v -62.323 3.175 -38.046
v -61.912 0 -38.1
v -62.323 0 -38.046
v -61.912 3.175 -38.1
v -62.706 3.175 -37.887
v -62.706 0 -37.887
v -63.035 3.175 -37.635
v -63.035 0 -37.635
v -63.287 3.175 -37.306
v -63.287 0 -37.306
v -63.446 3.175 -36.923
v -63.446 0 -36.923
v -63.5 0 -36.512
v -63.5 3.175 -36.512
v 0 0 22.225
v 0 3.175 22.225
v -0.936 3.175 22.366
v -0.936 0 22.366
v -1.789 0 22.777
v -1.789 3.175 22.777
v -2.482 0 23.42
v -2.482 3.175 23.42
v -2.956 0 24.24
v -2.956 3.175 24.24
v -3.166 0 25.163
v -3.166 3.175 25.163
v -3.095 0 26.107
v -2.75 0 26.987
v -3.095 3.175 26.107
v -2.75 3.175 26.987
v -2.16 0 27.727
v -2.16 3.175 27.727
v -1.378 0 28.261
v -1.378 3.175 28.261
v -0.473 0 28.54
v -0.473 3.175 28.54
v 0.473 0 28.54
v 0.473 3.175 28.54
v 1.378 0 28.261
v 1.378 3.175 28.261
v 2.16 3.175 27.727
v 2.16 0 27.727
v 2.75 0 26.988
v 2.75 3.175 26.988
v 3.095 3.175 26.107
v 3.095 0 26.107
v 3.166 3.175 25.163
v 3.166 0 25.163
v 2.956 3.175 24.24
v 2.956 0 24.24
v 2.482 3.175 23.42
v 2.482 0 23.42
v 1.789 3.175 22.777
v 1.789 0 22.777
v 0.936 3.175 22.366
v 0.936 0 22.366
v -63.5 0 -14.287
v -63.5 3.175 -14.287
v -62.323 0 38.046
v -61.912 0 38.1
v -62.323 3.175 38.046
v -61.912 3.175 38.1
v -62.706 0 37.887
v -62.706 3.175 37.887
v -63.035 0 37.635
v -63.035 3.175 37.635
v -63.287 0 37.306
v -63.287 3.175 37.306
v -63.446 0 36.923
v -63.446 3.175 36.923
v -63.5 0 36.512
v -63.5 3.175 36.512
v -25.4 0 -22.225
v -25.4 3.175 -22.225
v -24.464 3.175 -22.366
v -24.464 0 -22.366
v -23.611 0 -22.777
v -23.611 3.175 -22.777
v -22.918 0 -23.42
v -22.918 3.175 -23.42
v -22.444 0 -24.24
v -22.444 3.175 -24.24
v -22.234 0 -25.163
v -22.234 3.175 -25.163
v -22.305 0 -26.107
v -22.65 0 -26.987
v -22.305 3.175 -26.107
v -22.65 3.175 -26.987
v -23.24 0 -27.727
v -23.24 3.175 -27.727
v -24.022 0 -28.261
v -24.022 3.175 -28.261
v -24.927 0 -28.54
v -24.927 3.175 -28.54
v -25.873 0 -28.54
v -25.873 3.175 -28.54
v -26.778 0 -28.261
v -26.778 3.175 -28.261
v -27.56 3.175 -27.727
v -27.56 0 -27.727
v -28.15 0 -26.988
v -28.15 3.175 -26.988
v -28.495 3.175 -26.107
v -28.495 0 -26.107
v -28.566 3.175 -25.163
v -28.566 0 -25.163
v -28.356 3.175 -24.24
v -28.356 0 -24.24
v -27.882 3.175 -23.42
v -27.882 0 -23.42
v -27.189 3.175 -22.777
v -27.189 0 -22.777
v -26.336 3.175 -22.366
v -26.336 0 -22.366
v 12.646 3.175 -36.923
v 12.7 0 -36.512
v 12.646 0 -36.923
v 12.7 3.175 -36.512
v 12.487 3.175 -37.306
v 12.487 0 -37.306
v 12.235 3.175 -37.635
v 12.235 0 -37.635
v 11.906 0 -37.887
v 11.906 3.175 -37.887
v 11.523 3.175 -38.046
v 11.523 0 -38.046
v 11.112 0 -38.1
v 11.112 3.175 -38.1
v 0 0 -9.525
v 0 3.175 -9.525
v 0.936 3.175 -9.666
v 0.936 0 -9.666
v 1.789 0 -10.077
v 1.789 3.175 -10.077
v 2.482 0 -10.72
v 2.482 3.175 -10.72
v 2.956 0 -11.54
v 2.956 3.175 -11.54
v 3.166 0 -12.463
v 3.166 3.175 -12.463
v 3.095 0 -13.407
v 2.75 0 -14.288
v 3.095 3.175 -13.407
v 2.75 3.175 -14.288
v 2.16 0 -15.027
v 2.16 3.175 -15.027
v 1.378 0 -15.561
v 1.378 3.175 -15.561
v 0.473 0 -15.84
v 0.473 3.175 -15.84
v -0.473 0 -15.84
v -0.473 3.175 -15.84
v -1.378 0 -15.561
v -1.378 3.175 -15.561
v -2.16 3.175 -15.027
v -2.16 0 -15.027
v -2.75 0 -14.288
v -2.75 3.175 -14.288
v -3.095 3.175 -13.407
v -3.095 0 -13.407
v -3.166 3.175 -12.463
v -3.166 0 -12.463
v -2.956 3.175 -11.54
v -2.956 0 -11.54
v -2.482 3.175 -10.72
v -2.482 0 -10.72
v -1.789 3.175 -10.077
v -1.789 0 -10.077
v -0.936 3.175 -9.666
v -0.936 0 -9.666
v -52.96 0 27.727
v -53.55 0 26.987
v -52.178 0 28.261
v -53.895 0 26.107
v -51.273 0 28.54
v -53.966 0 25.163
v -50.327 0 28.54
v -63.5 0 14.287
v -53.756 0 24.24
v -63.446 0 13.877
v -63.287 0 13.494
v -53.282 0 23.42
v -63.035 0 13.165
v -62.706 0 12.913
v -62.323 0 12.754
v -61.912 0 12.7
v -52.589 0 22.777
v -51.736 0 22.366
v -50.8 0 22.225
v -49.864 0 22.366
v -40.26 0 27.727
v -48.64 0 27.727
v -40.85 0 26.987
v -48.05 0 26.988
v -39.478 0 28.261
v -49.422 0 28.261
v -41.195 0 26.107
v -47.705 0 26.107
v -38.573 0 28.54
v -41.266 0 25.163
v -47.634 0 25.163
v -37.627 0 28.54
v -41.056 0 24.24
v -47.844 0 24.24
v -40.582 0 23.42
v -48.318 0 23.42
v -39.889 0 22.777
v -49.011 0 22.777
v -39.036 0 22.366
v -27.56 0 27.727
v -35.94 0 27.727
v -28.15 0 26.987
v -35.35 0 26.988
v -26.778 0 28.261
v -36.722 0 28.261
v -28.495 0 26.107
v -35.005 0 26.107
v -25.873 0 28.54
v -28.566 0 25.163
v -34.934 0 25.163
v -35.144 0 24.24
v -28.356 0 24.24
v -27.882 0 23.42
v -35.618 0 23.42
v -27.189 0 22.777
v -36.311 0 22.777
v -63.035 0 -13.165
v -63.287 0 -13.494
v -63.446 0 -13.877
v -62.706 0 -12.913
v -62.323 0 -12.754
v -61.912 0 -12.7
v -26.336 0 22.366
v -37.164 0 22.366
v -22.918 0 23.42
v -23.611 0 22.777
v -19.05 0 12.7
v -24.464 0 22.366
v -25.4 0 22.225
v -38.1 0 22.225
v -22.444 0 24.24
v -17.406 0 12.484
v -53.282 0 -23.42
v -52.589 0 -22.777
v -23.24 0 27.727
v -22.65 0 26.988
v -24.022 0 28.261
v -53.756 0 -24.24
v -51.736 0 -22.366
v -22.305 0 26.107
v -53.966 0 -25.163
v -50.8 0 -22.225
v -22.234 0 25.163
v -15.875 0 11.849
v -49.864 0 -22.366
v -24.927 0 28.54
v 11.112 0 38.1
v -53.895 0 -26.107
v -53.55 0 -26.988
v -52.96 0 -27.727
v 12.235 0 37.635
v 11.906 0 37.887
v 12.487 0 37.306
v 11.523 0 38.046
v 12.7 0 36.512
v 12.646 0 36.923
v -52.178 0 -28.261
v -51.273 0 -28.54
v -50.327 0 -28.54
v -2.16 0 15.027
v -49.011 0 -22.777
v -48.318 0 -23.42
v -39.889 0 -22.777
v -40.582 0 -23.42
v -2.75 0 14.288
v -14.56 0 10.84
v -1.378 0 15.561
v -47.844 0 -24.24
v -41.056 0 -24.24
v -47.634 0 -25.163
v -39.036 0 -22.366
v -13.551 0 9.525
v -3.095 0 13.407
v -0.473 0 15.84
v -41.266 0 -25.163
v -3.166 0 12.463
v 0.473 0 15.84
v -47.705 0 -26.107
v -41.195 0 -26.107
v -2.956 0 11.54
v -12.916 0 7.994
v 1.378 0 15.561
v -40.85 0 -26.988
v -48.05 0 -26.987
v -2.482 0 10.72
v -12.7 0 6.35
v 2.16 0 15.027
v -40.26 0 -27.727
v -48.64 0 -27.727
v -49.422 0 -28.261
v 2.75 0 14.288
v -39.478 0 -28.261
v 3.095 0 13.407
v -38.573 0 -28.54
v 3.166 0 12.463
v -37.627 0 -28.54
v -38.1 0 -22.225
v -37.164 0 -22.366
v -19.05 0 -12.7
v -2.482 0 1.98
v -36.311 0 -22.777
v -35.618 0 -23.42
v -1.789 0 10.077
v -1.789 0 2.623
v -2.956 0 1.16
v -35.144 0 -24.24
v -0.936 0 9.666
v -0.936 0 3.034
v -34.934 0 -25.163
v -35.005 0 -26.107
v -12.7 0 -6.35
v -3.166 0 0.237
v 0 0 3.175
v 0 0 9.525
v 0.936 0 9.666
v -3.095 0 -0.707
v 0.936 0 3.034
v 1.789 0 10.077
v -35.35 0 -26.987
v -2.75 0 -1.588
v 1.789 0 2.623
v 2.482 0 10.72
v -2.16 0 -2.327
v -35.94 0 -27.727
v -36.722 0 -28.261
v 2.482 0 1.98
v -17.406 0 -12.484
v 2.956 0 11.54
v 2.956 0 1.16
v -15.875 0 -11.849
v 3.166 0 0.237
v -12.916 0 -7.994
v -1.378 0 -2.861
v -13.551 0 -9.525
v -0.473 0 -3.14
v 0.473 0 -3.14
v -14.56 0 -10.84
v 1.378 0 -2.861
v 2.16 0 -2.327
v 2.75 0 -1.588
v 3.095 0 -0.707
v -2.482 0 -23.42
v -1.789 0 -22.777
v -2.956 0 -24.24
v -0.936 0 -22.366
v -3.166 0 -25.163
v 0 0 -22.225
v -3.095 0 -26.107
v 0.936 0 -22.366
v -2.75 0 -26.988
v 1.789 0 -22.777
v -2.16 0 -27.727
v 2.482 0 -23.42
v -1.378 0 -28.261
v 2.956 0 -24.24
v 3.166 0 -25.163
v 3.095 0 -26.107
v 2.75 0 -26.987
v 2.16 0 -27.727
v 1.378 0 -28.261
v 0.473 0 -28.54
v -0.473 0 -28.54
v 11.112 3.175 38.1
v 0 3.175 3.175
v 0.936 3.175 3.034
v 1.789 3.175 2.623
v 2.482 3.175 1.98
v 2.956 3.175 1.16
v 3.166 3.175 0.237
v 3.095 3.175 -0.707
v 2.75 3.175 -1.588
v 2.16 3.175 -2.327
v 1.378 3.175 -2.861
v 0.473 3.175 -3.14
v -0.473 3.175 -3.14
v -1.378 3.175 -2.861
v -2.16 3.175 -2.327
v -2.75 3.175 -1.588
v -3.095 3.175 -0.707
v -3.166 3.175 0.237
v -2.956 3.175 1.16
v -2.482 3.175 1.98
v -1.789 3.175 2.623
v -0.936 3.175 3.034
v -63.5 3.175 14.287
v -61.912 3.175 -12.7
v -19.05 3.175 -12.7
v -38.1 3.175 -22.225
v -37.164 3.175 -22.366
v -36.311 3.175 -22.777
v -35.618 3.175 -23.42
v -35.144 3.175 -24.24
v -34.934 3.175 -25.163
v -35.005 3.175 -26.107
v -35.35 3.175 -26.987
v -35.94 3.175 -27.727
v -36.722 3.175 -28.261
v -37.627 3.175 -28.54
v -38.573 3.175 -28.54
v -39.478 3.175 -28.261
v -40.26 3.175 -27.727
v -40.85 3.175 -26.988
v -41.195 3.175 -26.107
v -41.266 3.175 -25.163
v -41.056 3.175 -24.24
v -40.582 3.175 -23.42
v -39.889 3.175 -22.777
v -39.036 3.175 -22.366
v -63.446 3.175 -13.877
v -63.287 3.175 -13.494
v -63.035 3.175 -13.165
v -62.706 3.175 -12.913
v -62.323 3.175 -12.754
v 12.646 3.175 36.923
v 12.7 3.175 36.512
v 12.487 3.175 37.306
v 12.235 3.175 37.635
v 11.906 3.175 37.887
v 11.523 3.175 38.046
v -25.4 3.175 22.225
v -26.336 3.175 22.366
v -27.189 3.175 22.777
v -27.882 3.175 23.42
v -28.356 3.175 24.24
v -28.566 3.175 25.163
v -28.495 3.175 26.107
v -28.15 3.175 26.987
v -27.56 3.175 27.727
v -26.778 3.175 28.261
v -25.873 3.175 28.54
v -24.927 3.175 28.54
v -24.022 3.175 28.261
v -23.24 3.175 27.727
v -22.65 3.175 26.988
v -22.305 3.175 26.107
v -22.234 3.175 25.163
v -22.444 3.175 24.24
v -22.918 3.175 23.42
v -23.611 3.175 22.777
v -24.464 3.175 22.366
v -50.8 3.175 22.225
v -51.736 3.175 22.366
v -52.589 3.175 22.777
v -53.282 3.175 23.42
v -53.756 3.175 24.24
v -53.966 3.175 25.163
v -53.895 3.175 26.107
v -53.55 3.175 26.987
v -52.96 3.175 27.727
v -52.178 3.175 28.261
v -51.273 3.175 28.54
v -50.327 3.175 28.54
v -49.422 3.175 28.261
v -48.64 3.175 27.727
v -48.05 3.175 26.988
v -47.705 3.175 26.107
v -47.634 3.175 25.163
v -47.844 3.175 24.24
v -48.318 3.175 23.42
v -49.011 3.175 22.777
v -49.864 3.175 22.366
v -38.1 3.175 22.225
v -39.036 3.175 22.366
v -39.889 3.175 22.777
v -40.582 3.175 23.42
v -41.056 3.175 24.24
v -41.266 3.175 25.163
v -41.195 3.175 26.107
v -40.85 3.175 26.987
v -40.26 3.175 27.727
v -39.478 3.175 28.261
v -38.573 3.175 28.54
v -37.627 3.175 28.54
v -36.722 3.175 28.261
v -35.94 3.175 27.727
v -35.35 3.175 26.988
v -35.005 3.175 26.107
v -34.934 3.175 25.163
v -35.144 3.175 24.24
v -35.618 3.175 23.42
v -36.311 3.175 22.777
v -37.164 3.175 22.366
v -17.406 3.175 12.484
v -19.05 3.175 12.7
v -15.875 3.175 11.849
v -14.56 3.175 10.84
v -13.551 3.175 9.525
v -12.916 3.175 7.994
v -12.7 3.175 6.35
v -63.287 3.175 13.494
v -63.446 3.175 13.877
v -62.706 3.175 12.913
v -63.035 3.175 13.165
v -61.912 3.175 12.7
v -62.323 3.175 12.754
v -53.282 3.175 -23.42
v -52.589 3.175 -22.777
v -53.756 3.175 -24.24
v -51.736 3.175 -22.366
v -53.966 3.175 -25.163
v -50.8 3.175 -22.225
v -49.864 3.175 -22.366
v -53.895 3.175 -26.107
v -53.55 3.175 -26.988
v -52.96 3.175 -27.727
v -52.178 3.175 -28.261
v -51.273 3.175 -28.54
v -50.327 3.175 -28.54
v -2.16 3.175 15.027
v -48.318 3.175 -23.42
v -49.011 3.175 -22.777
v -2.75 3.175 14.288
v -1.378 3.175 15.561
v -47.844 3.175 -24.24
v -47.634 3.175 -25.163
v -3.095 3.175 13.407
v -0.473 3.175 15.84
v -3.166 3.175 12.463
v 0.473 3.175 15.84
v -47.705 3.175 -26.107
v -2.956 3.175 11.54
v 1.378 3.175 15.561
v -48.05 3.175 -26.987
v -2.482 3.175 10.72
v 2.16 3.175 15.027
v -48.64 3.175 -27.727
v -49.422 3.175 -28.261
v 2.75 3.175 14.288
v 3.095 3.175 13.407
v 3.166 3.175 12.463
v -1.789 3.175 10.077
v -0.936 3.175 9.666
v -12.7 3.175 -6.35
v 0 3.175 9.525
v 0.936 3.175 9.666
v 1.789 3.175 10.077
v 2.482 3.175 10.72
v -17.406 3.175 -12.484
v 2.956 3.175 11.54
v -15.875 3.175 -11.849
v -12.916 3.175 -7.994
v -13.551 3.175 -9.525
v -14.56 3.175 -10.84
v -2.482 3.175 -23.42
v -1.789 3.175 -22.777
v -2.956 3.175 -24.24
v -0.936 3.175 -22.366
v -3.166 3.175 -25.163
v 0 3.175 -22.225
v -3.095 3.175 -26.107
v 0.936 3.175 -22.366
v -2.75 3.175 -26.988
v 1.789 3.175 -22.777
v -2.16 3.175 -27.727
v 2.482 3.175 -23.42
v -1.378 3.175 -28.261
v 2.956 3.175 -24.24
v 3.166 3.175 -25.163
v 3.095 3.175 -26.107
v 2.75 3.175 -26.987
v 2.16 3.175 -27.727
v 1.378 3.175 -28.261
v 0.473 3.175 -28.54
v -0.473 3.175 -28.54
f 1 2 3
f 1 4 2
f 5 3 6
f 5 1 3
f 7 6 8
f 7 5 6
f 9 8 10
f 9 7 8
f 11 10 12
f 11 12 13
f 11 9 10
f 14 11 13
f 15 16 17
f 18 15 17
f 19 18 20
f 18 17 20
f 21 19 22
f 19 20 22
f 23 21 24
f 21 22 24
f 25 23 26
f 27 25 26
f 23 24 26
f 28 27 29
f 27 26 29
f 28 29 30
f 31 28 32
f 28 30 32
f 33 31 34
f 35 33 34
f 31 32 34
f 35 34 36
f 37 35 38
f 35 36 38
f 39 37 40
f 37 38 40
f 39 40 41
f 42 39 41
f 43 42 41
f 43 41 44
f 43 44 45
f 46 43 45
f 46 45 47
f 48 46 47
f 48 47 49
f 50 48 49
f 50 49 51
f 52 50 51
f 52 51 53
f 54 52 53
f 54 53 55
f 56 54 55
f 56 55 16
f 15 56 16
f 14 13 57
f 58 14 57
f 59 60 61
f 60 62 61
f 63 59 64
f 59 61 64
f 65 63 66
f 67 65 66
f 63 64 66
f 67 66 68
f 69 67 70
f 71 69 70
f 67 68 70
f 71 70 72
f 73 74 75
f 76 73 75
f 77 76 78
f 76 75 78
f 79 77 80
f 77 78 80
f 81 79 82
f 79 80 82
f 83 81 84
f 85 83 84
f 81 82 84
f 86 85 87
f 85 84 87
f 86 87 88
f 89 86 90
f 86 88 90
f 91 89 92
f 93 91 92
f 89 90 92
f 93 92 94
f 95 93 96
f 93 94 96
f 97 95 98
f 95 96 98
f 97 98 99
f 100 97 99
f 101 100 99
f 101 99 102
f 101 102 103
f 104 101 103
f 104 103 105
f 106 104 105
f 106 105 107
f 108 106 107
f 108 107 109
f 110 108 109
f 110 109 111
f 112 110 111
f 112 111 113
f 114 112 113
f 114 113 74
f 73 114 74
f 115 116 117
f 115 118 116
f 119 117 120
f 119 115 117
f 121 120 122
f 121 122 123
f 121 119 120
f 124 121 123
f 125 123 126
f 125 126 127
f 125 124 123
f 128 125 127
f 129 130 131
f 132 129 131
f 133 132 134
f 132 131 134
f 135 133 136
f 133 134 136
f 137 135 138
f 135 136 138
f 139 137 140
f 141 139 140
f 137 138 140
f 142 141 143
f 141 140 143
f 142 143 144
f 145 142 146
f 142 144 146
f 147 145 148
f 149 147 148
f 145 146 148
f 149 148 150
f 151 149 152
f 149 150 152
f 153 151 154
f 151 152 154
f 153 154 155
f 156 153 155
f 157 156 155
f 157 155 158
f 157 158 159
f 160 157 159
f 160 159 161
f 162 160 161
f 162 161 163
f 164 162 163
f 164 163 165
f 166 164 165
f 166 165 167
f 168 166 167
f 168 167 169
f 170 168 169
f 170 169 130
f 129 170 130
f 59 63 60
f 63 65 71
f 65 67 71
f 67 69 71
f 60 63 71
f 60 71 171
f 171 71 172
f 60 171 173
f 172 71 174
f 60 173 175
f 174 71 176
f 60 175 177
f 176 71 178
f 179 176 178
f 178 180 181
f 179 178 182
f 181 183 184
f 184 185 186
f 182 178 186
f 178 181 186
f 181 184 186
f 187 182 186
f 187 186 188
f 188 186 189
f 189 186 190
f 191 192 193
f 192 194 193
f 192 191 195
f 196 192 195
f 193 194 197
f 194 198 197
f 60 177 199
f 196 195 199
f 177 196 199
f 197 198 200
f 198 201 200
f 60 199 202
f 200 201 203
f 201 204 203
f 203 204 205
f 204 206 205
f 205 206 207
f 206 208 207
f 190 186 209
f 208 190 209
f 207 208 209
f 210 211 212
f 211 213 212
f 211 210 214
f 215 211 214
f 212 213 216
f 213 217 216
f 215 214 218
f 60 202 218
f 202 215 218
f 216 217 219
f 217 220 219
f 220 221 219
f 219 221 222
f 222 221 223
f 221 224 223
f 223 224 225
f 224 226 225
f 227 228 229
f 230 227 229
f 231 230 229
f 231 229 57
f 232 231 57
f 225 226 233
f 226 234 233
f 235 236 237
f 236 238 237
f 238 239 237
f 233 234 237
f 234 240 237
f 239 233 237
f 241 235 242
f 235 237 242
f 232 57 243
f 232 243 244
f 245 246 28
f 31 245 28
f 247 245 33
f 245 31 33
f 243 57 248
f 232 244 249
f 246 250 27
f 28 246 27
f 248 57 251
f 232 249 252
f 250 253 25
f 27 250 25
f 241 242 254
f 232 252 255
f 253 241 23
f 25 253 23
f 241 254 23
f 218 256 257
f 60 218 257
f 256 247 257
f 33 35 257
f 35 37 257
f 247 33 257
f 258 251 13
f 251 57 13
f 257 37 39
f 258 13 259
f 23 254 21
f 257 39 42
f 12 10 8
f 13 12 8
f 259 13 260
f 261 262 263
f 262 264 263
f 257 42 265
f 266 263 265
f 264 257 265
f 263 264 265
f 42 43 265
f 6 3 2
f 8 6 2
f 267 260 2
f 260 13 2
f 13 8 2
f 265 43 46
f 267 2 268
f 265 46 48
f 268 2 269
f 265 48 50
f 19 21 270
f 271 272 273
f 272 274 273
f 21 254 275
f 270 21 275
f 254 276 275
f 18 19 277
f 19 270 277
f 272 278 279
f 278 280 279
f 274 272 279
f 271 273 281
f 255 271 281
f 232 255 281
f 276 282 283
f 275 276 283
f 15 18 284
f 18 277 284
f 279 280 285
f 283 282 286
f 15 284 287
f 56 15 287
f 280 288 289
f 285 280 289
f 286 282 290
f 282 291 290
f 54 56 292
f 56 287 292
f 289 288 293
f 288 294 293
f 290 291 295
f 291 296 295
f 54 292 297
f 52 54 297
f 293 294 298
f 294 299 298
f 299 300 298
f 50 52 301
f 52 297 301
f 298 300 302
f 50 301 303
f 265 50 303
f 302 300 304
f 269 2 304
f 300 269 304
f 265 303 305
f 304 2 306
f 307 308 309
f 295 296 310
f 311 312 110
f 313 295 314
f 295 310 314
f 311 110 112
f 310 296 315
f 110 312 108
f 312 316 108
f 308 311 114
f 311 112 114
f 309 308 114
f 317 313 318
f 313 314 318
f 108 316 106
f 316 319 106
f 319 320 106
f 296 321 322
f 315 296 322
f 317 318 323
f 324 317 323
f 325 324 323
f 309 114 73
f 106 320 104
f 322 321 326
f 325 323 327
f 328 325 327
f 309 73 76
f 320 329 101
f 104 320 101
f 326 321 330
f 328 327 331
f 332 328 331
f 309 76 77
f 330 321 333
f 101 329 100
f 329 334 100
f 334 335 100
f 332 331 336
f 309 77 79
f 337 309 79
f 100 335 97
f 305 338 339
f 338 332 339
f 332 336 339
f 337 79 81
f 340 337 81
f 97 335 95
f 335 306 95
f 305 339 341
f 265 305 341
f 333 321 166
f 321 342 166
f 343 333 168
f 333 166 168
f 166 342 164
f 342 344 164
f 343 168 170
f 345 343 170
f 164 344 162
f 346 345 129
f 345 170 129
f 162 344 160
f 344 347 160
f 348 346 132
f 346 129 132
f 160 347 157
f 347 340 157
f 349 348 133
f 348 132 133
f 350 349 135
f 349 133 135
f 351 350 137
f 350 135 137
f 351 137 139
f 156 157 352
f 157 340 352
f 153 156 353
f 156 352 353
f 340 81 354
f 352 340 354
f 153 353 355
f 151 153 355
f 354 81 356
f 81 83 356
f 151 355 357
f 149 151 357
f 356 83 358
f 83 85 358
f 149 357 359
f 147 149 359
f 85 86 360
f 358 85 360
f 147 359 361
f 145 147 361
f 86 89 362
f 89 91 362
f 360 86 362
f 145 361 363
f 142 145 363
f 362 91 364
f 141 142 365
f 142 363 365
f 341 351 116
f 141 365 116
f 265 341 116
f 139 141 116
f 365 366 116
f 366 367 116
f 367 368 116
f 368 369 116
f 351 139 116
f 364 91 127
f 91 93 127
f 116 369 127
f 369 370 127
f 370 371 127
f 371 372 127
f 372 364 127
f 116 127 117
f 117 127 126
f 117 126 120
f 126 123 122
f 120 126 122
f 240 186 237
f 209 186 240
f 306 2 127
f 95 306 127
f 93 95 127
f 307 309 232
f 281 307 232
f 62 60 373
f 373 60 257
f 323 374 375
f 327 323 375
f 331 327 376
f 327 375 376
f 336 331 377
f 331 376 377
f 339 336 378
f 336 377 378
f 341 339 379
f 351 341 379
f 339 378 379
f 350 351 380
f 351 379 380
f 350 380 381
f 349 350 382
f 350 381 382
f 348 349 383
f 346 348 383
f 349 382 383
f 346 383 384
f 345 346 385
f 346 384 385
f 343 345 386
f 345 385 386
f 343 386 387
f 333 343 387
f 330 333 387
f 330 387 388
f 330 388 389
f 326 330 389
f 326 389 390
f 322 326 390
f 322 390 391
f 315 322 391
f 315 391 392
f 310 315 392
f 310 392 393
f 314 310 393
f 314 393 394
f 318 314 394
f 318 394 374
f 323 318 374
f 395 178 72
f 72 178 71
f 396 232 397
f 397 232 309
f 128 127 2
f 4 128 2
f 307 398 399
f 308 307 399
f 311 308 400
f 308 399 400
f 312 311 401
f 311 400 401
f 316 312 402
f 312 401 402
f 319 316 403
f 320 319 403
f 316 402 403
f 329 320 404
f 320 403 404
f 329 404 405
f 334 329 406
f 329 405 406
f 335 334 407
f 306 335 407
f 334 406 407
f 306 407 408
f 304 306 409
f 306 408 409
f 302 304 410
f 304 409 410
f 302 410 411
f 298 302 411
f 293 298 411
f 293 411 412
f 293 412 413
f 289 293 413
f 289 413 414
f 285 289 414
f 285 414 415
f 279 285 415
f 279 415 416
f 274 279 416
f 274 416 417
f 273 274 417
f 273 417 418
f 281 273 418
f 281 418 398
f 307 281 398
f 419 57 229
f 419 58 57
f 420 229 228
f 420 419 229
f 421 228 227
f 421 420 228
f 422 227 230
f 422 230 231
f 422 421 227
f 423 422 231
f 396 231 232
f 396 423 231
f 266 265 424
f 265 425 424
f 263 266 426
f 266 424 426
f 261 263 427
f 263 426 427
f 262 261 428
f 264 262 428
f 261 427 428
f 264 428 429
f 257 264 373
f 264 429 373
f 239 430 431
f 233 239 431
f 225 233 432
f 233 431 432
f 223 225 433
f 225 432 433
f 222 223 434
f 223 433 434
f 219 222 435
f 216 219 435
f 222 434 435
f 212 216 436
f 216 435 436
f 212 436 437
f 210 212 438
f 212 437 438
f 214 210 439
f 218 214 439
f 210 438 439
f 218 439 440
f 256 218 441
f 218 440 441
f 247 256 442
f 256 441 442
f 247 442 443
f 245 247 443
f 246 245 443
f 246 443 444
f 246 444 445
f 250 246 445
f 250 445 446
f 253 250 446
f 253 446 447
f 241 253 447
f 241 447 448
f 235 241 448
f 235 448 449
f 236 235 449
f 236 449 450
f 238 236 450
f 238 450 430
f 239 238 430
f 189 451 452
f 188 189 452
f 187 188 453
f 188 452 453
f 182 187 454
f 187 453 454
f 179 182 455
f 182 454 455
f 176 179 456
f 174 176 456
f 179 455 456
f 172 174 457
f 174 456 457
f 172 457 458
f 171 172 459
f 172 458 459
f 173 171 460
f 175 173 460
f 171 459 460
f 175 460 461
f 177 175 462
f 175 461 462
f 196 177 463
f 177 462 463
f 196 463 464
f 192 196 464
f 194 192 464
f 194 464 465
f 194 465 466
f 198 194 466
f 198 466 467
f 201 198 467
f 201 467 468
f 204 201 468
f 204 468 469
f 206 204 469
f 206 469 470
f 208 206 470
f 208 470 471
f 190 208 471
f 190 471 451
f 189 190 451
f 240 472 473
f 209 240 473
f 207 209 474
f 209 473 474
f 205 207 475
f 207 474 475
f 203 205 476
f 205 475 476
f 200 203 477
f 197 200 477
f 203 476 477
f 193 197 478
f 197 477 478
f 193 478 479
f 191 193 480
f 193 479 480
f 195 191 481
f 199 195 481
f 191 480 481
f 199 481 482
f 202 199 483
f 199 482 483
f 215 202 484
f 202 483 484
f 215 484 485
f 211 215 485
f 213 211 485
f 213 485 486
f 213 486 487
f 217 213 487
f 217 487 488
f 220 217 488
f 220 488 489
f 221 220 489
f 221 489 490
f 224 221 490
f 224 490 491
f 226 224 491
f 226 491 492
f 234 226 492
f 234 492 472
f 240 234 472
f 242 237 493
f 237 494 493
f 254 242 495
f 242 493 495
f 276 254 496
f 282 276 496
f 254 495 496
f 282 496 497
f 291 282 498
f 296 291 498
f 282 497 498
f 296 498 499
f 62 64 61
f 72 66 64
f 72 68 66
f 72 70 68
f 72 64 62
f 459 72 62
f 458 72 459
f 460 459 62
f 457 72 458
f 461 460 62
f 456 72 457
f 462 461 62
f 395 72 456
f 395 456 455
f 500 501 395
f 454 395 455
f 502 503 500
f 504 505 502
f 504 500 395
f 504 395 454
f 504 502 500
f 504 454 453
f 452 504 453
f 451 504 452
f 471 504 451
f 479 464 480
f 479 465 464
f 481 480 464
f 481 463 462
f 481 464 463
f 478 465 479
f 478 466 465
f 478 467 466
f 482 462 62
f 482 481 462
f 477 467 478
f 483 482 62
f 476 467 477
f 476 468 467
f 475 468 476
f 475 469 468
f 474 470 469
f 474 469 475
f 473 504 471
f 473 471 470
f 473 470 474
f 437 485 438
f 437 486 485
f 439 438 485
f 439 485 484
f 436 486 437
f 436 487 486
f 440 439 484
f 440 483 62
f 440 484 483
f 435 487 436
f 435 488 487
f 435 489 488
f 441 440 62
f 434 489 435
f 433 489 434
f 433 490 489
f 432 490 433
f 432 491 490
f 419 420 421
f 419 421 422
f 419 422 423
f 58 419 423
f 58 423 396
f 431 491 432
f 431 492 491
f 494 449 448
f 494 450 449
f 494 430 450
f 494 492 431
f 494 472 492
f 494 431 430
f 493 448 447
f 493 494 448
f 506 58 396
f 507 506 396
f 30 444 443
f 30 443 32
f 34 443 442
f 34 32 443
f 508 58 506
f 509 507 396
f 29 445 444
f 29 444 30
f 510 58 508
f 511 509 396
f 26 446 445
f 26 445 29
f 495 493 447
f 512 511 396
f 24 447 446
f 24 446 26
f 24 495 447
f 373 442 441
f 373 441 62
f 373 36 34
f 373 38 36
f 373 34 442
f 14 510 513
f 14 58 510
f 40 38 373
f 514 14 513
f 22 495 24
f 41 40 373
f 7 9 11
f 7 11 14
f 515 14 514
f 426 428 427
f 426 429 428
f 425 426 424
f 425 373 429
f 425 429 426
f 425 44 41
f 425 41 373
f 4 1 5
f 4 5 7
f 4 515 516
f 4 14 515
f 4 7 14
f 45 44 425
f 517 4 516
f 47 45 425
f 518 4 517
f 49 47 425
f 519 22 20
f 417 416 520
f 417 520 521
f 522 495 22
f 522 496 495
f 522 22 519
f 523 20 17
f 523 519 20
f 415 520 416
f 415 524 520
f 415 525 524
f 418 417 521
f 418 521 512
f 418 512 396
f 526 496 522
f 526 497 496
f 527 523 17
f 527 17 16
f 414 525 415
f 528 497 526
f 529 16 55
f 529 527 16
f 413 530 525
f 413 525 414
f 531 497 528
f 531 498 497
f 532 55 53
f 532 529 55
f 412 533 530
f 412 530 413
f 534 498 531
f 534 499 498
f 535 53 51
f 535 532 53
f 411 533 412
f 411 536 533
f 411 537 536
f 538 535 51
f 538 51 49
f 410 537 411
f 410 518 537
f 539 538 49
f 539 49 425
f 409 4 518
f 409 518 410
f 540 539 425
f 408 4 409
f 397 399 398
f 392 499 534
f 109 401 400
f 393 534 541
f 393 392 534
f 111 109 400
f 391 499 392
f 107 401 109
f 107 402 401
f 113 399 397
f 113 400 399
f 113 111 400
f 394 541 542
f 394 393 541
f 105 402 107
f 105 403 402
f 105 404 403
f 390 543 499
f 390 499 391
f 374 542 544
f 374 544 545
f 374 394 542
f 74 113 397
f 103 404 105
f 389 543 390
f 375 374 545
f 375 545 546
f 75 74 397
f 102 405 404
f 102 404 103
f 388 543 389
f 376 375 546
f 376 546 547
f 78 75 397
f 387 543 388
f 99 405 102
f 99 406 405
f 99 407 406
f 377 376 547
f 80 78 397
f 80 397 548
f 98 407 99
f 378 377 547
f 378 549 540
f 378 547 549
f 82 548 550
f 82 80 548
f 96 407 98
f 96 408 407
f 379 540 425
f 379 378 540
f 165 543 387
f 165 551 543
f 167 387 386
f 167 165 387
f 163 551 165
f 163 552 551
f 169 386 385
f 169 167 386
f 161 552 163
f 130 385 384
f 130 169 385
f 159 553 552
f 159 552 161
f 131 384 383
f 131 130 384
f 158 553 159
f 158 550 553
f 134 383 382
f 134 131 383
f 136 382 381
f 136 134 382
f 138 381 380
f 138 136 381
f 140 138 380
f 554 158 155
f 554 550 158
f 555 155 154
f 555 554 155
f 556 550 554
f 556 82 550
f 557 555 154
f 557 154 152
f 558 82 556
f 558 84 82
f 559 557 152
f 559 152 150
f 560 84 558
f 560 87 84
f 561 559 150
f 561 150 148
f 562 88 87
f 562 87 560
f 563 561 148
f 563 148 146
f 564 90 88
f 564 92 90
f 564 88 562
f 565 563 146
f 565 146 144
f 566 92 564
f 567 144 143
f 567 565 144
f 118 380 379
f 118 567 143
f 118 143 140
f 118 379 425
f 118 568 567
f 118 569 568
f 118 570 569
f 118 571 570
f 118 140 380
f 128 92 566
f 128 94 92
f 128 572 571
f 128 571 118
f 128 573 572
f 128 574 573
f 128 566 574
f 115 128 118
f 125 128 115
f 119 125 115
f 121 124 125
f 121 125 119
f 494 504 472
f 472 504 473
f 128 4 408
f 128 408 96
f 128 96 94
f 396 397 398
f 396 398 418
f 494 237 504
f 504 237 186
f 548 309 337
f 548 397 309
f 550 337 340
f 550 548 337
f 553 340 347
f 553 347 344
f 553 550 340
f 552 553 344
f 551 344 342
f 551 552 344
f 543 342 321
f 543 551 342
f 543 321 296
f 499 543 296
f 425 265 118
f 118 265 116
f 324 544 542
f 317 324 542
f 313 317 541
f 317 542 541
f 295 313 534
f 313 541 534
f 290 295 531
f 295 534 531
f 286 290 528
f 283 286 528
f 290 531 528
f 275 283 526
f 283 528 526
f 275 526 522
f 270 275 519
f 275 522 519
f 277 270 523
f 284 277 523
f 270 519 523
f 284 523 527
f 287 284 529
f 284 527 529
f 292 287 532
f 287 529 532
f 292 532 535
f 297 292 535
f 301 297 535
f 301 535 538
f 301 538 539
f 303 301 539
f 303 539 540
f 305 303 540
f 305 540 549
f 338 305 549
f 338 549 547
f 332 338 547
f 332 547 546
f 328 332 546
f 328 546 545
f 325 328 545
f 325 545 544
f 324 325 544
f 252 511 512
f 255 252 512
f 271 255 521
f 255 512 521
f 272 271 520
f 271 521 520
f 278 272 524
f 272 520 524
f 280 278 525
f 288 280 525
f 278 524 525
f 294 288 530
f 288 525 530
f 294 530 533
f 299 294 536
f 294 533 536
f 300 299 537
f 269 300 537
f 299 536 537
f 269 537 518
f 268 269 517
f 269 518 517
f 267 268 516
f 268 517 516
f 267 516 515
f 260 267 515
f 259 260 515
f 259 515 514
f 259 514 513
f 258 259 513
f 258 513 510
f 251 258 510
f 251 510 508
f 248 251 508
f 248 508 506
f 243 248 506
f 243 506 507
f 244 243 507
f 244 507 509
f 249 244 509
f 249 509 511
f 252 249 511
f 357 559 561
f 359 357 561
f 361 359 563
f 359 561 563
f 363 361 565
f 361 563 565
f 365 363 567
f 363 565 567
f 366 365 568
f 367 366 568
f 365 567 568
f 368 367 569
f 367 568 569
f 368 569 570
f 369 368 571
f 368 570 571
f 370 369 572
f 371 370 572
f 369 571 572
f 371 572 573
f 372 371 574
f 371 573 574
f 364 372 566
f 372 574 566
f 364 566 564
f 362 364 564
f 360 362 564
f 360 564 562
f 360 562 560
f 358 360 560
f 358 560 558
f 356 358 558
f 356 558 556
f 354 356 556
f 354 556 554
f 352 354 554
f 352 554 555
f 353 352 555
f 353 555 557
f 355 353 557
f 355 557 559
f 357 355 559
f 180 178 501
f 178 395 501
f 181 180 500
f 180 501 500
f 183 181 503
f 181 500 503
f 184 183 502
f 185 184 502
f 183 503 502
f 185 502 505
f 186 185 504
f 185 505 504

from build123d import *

# Parameters (mm, degrees)
BOSS_EXTRUDE1_DEPTH = 3.175
SKETCH2_R           = 3.175
CUT_EXTRUDE1_DEPTH  = 75.121121315
FILLET1_R           = 1.5875
FILLET2_R           = 6.35


with BuildPart() as part:
    # Sketch1 → Boss-Extrude1 (new body)
    with BuildSketch(Plane(origin=(0, 0, 0), x_dir=(1, 0, 0), z_dir=(0, 1, 0))):
        Polygon((-12.7, -38.1), (12.7, -38.1), (12.7, 38.1), (-12.7, 38.1), (-63.5, 38.1), (-63.5, 12.7), (-12.7, 12.7), (-12.7, -12.7), (-63.5, -12.7), (-63.5, -38.1), align=None)
    extrude(amount=BOSS_EXTRUDE1_DEPTH)

    # Sketch2 → Cut-Extrude1 (cut, through all)
    with BuildSketch(Plane(origin=(0, 3.175, 0), x_dir=(1, 0, 0), z_dir=(0, 1, 0))):
        with Locations(Location((0, 0, 0), (0, 0, 270))):
            Circle(SKETCH2_R)
        with Locations(Location((0, 12.7, 0), (0, 0, 270))):
            Circle(SKETCH2_R)
        with Locations(Location((0, 25.4, 0), (0, 0, 270))):
            Circle(SKETCH2_R)
        with Locations(Location((0, -25.4, 0), (0, 0, 90))):
            Circle(SKETCH2_R)
        with Locations(Location((0, -12.7, 0), (0, 0, 90))):
            Circle(SKETCH2_R)
        with Locations(Location((-50.8, 25.4, 0), (0, 0, 270))):
            Circle(SKETCH2_R)
        with Locations(Location((-38.1, 25.4, 0), (0, 0, 270))):
            Circle(SKETCH2_R)
        with Locations(Location((-25.4, 25.4, 0), (0, 0, 270))):
            Circle(SKETCH2_R)
        with Locations(Location((-25.4, -25.4, 0), (0, 0, 90))):
            Circle(SKETCH2_R)
        with Locations(Location((-38.1, -25.4, 0), (0, 0, 90))):
            Circle(SKETCH2_R)
        with Locations(Location((-50.8, -25.4, 0), (0, 0, 90))):
            Circle(SKETCH2_R)
    extrude(amount=-CUT_EXTRUDE1_DEPTH, mode=Mode.SUBTRACT)

    # Fillet1
    fillet1_edges = [part.edges().sort_by_distance(p)[0] for p in [
        (12.7, 1.5875, 38.1),
        (-63.5, 1.5875, 38.1),
        (-63.5, 1.5875, 12.7),
        (-63.5, 1.5875, -12.7),
        (-63.5, 1.5875, -38.1),
        (12.7, 1.5875, -38.1),
    ]]
    fillet(fillet1_edges, radius=FILLET1_R)

    # Fillet2
    fillet2_edges = [part.edges().sort_by_distance(p)[0] for p in [
        (-12.7, 1.5875, 12.7),
        (-12.7, 1.5875, -12.7),
    ]]
    fillet(fillet2_edges, radius=FILLET2_R)


solid = part.part
